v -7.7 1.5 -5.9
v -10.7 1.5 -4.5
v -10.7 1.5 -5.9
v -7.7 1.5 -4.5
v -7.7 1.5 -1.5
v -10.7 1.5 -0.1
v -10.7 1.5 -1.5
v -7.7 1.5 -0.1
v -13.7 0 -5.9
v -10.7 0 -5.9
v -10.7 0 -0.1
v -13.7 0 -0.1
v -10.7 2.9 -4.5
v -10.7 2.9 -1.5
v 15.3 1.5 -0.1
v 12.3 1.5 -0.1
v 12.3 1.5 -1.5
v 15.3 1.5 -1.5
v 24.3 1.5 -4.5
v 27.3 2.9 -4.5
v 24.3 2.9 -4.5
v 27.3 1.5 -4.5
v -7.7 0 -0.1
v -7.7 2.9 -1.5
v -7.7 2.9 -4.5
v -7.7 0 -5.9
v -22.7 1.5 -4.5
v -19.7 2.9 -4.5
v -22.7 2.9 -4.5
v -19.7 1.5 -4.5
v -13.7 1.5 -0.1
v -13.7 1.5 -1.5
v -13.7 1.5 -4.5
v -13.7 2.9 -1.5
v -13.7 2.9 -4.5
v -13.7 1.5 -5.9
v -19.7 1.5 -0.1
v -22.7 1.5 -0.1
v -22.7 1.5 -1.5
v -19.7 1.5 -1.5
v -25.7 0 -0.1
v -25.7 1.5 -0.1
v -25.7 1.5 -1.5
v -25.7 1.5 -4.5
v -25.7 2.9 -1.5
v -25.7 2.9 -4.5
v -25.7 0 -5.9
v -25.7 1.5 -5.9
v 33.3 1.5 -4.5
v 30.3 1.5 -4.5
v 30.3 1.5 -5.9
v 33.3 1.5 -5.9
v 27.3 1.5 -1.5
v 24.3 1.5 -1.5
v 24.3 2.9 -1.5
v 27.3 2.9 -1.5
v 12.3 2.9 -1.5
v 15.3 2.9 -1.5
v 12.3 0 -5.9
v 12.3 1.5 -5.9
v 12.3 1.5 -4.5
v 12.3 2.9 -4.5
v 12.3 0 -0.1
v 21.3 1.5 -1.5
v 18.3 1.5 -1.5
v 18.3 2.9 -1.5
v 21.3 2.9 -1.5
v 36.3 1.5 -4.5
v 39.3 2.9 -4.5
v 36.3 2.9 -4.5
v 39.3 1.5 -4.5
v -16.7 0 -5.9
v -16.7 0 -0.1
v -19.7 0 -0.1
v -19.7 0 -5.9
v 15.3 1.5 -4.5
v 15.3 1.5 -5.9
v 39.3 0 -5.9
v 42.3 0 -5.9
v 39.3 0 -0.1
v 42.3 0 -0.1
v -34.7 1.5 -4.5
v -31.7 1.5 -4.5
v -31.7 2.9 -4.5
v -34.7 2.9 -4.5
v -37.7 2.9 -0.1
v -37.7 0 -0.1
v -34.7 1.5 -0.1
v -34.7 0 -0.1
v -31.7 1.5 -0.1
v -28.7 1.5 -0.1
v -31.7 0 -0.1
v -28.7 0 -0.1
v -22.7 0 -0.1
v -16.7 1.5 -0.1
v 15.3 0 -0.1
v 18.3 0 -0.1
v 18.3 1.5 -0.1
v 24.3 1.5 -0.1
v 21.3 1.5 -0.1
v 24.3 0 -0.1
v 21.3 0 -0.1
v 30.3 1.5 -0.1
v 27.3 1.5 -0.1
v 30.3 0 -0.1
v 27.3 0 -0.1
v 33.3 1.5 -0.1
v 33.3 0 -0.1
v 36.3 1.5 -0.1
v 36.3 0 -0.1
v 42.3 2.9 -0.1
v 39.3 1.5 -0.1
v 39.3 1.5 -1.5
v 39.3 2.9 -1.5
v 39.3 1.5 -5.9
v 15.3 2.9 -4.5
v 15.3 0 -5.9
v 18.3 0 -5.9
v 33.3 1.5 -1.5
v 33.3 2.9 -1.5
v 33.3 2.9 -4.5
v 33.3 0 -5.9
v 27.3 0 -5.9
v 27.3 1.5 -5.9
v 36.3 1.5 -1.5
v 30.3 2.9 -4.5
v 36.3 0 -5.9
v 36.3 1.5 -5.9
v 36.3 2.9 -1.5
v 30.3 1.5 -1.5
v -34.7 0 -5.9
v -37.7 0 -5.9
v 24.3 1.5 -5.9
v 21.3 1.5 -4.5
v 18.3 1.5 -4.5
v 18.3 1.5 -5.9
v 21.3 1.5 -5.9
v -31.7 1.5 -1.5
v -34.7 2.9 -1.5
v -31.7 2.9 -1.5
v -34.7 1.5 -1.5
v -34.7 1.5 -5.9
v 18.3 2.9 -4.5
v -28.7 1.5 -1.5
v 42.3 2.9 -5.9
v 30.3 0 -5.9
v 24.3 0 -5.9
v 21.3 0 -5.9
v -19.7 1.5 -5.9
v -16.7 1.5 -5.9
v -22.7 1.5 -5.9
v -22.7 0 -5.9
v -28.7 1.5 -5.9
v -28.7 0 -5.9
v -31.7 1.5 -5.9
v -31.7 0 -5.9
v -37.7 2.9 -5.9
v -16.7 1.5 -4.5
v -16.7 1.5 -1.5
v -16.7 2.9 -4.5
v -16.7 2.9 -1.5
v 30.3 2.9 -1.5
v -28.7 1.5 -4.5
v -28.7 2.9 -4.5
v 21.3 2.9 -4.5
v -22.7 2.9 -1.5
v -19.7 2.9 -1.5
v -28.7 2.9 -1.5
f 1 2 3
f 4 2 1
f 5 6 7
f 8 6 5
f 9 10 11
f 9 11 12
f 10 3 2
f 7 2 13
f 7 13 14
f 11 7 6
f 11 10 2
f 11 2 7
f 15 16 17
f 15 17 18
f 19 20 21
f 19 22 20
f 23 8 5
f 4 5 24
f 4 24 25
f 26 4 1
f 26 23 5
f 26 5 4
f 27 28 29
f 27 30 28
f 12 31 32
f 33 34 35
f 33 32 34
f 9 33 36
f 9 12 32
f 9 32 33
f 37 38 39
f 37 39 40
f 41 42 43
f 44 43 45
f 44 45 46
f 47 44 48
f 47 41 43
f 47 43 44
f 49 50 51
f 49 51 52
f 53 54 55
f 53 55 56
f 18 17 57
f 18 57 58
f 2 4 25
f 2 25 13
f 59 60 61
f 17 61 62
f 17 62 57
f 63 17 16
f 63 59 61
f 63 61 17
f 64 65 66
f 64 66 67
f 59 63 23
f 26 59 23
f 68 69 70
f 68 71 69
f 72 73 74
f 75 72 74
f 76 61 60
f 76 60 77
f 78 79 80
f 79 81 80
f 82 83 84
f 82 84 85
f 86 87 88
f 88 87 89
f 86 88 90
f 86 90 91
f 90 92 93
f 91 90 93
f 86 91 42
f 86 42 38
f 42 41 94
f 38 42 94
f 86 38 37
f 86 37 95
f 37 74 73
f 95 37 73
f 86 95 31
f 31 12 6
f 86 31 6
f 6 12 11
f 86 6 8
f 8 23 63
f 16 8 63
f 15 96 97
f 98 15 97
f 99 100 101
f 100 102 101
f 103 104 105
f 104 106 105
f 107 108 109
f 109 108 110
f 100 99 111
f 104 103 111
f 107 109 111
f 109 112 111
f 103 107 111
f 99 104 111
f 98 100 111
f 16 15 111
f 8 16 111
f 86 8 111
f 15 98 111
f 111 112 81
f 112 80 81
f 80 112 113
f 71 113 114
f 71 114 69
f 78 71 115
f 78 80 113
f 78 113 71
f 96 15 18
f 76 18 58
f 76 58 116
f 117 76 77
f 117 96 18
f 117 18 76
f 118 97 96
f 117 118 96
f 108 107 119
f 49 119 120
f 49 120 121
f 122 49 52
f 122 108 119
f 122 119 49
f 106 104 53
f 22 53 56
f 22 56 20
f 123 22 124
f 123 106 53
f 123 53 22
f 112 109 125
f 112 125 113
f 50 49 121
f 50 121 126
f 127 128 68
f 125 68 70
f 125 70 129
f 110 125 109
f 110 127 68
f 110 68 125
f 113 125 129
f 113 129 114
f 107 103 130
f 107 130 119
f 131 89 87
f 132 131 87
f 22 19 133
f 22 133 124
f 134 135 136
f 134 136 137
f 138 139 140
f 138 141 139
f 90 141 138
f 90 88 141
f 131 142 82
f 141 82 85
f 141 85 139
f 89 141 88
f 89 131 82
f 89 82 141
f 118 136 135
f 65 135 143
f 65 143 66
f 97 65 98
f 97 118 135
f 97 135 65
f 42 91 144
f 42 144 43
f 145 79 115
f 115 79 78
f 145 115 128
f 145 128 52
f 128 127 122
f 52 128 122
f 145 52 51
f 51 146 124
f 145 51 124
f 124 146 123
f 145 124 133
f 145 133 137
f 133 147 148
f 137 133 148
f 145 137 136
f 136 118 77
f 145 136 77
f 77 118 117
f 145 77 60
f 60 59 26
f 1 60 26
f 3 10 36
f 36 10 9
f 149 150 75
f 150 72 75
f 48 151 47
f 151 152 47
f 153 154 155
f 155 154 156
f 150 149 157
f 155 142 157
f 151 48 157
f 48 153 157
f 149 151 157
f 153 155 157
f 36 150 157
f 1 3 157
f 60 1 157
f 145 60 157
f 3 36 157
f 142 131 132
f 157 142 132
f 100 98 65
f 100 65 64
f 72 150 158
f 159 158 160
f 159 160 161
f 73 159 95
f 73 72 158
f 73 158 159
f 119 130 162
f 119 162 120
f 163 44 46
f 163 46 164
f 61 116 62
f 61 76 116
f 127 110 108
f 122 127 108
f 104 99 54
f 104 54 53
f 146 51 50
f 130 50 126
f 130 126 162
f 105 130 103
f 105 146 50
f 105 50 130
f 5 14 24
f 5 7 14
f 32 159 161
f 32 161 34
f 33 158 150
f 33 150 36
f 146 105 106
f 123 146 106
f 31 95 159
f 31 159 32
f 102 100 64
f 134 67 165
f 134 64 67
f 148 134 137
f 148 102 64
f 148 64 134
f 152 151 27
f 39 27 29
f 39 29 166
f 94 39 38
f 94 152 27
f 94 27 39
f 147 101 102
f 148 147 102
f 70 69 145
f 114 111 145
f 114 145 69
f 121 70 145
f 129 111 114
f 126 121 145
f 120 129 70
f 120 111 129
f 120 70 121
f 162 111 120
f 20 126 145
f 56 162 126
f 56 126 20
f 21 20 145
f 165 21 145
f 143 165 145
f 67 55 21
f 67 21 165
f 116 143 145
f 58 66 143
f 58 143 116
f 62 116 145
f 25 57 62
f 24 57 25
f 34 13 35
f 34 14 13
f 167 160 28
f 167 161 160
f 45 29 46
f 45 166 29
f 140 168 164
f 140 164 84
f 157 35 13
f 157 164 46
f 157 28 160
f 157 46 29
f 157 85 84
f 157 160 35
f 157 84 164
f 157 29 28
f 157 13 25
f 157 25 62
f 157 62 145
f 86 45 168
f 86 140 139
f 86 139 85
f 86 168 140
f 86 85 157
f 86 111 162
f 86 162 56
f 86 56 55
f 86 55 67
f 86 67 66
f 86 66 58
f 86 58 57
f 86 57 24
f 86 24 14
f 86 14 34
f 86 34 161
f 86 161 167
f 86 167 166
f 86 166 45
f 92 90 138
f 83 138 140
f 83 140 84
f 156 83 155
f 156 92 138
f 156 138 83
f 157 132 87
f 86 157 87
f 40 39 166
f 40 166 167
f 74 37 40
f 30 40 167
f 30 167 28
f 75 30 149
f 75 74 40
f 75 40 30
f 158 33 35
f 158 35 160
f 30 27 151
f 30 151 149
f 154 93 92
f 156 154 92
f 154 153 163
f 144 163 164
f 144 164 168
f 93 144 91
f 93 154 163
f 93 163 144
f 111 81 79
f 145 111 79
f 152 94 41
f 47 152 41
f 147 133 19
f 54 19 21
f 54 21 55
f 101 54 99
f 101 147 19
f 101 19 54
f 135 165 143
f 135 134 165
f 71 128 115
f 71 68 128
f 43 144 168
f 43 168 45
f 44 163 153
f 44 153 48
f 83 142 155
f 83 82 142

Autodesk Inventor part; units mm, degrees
ref_plane "YZ Plane" through (0, 0, 0) normal (1, 0, 0) x (0, 1, 0)
ref_plane "XZ Plane" through (0, 0, 0) normal (0, 1, 0) x (-1, 0, 0)
ref_plane "XY Plane" through (0, 0, 0) normal (0, 0, 1) x (1, 0, 0)
sketch "Sketch1" plane through (0, 0, 0) normal (0, 1, 0) x (-1, 0, 0)
  line L0 (-4.6, -6) -> (-4.6, 0) projected
  line L1 (0, -6) -> (-4.6, -6) projected
  line L2 (0, 0) -> (0, -6) projected
  line L3 (0, 0) -> (-4.6, 0) projected
  line L4 (37.7, -0.1) -> (-42.3, -0.1)
  line L5 (-42.3, -0.1) -> (-42.3, -5.9)
  line L6 (-42.3, -5.9) -> (37.7, -5.9)
  line L7 (37.7, -5.9) -> (37.7, -0.1)
  line L8 (-2.3, -6) -> (-2.3, 0) construction
  dimension "d0" = 0.1
  dimension "d1" = 0.1
  dimension "d2" = 80
extrude "Extrusion1" add sketch "Sketch1" along normal blind 2.9 contours L6 L5 L4 L0 | L0 L4 L2 L6 | L2 L4 L7 L6
sketch "Sketch3" plane through (0, 0, 0) normal (0, -1, 0) x (1, 0, 0)
  line L0 (42.3, -5.9) -> (-37.7, -5.9) projected
  line L1 (-37.7, -0.1) -> (42.3, -0.1) projected
  line L2 (39.3, -5.9) -> (36.3, -5.9)
  line L3 (36.3, -5.9) -> (36.3, -0.1)
  line L4 (36.3, -0.1) -> (39.3, -0.1)
  line L5 (39.3, -0.1) -> (39.3, -5.9)
  line L6 (39.3, -4.5) -> (36.3, -4.5)
  line L7 (36.3, -4.5) -> (36.3, -1.5)
  line L8 (36.3, -1.5) -> (39.3, -1.5)
  line L9 (39.3, -1.5) -> (39.3, -4.5)
  line L10 (39.3, -3) -> (36.3, -3) construction
  line L11 (42.3, -0.1) -> (42.3, -5.9) projected
  point P0 (0, 0)
  dimension "d5" = 3
  dimension "d6" = 3
extrude "Extrusion2" cut sketch "Sketch3" against normal through all contours L6 L3 L8 L5
extrude "Extrusion3" cut sketch "Sketch3" against normal blind 1.5 contours L0 L3 L6 L5 | L5 L8 L3 L1
pattern_linear "Rectangular Pattern1" count 5 spacing 6 along (-1, 0, 0) of "Extrusion3", "Extrusion2"
ref_plane "Work Plane1" through (2.3, 0, -0.1) normal (1, 0, 0) x (0, 0, -1)
mirror "Mirror1" about plane through (2.3, 0, -0.1) normal (1, 0, 0) of "Extrusion3", "Extrusion2", "Rectangular Pattern1"
equation "\"d0\" = slack"
equation "\"d1\" = slack"
equation "\"slack\" = 0.1"
properties part number "Slider"
